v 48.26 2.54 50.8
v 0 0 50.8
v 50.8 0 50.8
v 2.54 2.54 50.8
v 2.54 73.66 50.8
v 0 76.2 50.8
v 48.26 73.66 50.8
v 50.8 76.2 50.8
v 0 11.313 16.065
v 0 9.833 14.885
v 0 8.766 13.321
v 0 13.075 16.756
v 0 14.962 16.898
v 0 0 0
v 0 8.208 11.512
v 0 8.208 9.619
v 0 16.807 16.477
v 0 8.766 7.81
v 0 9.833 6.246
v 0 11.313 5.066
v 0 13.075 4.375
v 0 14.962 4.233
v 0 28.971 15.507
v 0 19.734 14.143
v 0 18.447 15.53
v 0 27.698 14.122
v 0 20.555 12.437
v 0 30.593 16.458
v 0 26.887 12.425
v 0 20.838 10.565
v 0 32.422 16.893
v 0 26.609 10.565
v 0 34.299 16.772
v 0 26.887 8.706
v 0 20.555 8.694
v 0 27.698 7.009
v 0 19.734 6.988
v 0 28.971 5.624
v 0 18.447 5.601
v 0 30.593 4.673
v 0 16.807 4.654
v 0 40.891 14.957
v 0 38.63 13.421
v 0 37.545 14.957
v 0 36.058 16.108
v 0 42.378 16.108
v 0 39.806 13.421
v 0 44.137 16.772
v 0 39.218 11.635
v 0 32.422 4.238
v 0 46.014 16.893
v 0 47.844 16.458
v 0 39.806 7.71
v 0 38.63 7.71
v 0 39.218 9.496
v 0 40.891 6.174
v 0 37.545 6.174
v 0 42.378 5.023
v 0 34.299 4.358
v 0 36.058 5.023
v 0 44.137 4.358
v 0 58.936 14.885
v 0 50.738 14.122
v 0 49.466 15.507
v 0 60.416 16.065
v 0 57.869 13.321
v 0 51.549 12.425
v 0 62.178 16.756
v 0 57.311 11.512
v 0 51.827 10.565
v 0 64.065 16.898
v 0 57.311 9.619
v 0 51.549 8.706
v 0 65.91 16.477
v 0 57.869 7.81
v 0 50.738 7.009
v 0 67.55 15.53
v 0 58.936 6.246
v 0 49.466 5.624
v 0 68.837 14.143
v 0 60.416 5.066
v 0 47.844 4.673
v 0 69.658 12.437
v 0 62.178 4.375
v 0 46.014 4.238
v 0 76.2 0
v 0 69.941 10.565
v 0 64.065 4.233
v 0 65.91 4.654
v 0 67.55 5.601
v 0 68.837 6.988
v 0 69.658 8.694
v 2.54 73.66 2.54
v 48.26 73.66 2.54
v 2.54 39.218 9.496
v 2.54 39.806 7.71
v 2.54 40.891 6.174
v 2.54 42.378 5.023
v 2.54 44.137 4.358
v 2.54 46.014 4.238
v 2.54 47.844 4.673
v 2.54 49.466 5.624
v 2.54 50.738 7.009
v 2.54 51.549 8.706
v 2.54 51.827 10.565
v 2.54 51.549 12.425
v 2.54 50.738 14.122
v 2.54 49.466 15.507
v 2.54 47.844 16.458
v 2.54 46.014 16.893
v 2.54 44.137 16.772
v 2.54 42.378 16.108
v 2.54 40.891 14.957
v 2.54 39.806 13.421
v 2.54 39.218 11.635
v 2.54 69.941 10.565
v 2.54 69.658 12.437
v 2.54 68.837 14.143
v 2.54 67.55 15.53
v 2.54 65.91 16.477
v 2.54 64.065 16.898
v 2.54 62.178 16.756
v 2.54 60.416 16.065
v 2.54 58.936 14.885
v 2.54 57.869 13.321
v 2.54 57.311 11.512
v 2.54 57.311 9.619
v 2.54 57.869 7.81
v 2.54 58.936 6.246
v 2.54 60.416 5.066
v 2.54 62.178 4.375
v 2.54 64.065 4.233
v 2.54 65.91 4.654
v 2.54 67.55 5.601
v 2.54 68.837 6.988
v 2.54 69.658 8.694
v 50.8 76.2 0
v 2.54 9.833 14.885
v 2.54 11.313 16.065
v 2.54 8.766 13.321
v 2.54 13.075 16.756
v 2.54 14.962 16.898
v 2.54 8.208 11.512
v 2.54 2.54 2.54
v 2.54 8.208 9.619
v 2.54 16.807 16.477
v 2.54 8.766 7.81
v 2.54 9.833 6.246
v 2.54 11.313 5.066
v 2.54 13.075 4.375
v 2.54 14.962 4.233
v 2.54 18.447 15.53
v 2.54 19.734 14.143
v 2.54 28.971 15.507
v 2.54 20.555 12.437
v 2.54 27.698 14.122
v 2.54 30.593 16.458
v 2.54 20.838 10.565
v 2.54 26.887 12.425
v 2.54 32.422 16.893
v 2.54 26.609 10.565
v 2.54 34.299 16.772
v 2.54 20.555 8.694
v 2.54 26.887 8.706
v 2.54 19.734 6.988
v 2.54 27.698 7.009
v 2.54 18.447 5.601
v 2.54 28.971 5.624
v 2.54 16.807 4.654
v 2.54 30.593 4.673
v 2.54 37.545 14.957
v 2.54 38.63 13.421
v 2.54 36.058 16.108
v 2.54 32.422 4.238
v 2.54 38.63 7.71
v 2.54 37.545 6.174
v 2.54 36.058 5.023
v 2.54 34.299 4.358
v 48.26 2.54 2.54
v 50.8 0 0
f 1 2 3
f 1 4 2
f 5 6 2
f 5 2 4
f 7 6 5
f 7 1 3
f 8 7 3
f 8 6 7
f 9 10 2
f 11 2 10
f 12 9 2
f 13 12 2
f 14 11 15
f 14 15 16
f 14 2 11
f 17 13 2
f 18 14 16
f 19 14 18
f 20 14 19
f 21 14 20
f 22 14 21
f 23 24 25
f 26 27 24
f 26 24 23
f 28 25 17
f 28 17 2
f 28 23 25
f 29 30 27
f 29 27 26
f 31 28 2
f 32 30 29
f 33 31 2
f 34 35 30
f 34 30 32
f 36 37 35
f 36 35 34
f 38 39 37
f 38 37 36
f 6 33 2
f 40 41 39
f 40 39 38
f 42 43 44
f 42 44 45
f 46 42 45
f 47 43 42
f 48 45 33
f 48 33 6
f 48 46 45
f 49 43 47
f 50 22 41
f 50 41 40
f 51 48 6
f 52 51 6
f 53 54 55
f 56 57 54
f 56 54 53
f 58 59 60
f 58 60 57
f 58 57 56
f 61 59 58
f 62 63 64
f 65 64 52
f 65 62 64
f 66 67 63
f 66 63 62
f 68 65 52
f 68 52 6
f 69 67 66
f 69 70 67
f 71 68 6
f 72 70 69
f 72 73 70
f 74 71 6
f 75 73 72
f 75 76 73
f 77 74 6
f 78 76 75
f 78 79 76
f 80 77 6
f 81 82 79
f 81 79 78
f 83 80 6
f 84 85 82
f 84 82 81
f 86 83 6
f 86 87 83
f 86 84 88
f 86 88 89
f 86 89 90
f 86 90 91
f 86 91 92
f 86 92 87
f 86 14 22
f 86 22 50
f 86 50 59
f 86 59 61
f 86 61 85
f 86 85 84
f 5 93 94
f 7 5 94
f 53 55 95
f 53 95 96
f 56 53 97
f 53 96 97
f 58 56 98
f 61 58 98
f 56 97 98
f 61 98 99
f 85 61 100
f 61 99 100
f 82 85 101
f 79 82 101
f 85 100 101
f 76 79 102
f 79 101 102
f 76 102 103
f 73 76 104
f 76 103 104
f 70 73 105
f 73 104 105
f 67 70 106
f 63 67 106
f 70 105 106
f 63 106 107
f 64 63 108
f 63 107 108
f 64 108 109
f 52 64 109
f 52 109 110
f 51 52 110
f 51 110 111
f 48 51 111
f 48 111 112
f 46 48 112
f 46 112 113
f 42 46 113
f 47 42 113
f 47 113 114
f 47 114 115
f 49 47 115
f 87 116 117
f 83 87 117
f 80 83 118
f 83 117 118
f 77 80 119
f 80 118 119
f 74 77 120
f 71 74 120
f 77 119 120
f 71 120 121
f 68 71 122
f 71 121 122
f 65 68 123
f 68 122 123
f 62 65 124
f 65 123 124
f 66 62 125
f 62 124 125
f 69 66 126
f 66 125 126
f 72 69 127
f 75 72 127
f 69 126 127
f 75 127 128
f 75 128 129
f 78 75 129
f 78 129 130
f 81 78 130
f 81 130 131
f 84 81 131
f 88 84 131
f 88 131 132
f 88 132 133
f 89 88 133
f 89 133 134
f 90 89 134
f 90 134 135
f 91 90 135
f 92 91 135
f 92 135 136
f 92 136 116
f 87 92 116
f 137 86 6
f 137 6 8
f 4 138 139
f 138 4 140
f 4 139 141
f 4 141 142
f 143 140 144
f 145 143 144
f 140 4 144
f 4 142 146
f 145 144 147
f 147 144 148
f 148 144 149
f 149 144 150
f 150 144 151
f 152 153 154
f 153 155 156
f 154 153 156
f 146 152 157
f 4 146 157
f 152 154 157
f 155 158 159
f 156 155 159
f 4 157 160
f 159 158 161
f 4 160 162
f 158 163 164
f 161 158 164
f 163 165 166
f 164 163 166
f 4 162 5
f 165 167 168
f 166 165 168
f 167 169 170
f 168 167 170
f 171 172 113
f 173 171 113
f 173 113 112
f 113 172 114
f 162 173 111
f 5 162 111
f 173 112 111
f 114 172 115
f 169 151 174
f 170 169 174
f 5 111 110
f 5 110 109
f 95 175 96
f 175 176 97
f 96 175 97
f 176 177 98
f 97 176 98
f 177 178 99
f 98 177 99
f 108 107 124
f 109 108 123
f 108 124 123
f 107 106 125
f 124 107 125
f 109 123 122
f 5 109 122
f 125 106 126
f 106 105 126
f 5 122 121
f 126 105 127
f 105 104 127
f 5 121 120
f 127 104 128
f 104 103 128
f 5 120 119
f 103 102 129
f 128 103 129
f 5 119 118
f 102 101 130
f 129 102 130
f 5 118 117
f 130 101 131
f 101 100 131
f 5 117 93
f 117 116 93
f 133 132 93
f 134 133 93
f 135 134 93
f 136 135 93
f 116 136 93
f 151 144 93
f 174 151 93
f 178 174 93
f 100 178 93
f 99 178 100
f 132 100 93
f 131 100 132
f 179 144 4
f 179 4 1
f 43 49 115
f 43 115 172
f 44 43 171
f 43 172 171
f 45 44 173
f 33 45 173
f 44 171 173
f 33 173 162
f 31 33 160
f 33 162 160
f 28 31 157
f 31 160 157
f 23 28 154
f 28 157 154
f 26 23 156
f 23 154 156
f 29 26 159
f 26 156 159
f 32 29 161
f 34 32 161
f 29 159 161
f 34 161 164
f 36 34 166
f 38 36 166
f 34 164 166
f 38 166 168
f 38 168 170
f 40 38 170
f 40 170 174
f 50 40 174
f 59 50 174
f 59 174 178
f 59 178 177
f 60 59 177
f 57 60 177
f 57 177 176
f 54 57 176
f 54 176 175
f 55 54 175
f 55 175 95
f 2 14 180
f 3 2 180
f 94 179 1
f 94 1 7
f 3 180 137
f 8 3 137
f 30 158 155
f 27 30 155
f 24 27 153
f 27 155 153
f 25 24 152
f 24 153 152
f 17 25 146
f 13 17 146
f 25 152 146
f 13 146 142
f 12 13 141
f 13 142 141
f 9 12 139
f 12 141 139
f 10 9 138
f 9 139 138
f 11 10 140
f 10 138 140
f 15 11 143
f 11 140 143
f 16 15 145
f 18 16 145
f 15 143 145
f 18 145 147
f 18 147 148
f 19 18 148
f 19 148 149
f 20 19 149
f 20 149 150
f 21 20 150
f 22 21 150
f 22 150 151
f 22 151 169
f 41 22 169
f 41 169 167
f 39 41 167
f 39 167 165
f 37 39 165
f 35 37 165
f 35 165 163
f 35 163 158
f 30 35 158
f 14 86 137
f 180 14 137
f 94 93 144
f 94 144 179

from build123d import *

# Parameters (mm, degrees)
F2_W     = 50.8
F2_H     = 76.2
F2_W_2   = 45.72
F2_H_2   = 71.12
F3_DEPTH = 50.8
F4_W     = 50.8
F4_H     = 76.2
F5_DEPTH = 2.54
F8_D     = 12.7
F8_DEPTH = 5.08
F8_TIP   = 3.8154649308


# Not quite as in the source:
# - a variable given as a bare number and used for a length is read in inches; the dataset says mm whatever the document's units were


with BuildPart() as f3:
    # F2 (on Top) → F3 (new body)
    with BuildSketch(Plane.XY):
        with Locations((25.4, 38.1)):
            Rectangle(F2_W, F2_H)
        with Locations((25.4, 38.1)):
            Rectangle(F2_W_2, F2_H_2, mode=Mode.SUBTRACT)
    extrude(amount=F3_DEPTH)

    # F4 (on Top) → F5 (join)
    with BuildSketch(Plane.XY):
        with Locations((25.4, 38.1)):
            Rectangle(F4_W, F4_H)
    extrude(amount=F5_DEPTH)

    # F8
    with Locations(Plane(origin=(0, 0, 0), x_dir=(0, -1, 0), z_dir=(-1, 0, 0))):
        with Locations((-14.4875170663, 10.56548208), (-32.958894968, 10.56548208), (-45.4774573445, 10.56548208), (-63.5905191302, 10.56548208)):
            Hole(F8_D / 2, depth=F8_DEPTH)
            with Locations((0, 0, -(F8_DEPTH + F8_TIP / 2))):  # 118° drill point
                Cone(0, F8_D / 2, F8_TIP, mode=Mode.SUBTRACT)


solid = f3.part
